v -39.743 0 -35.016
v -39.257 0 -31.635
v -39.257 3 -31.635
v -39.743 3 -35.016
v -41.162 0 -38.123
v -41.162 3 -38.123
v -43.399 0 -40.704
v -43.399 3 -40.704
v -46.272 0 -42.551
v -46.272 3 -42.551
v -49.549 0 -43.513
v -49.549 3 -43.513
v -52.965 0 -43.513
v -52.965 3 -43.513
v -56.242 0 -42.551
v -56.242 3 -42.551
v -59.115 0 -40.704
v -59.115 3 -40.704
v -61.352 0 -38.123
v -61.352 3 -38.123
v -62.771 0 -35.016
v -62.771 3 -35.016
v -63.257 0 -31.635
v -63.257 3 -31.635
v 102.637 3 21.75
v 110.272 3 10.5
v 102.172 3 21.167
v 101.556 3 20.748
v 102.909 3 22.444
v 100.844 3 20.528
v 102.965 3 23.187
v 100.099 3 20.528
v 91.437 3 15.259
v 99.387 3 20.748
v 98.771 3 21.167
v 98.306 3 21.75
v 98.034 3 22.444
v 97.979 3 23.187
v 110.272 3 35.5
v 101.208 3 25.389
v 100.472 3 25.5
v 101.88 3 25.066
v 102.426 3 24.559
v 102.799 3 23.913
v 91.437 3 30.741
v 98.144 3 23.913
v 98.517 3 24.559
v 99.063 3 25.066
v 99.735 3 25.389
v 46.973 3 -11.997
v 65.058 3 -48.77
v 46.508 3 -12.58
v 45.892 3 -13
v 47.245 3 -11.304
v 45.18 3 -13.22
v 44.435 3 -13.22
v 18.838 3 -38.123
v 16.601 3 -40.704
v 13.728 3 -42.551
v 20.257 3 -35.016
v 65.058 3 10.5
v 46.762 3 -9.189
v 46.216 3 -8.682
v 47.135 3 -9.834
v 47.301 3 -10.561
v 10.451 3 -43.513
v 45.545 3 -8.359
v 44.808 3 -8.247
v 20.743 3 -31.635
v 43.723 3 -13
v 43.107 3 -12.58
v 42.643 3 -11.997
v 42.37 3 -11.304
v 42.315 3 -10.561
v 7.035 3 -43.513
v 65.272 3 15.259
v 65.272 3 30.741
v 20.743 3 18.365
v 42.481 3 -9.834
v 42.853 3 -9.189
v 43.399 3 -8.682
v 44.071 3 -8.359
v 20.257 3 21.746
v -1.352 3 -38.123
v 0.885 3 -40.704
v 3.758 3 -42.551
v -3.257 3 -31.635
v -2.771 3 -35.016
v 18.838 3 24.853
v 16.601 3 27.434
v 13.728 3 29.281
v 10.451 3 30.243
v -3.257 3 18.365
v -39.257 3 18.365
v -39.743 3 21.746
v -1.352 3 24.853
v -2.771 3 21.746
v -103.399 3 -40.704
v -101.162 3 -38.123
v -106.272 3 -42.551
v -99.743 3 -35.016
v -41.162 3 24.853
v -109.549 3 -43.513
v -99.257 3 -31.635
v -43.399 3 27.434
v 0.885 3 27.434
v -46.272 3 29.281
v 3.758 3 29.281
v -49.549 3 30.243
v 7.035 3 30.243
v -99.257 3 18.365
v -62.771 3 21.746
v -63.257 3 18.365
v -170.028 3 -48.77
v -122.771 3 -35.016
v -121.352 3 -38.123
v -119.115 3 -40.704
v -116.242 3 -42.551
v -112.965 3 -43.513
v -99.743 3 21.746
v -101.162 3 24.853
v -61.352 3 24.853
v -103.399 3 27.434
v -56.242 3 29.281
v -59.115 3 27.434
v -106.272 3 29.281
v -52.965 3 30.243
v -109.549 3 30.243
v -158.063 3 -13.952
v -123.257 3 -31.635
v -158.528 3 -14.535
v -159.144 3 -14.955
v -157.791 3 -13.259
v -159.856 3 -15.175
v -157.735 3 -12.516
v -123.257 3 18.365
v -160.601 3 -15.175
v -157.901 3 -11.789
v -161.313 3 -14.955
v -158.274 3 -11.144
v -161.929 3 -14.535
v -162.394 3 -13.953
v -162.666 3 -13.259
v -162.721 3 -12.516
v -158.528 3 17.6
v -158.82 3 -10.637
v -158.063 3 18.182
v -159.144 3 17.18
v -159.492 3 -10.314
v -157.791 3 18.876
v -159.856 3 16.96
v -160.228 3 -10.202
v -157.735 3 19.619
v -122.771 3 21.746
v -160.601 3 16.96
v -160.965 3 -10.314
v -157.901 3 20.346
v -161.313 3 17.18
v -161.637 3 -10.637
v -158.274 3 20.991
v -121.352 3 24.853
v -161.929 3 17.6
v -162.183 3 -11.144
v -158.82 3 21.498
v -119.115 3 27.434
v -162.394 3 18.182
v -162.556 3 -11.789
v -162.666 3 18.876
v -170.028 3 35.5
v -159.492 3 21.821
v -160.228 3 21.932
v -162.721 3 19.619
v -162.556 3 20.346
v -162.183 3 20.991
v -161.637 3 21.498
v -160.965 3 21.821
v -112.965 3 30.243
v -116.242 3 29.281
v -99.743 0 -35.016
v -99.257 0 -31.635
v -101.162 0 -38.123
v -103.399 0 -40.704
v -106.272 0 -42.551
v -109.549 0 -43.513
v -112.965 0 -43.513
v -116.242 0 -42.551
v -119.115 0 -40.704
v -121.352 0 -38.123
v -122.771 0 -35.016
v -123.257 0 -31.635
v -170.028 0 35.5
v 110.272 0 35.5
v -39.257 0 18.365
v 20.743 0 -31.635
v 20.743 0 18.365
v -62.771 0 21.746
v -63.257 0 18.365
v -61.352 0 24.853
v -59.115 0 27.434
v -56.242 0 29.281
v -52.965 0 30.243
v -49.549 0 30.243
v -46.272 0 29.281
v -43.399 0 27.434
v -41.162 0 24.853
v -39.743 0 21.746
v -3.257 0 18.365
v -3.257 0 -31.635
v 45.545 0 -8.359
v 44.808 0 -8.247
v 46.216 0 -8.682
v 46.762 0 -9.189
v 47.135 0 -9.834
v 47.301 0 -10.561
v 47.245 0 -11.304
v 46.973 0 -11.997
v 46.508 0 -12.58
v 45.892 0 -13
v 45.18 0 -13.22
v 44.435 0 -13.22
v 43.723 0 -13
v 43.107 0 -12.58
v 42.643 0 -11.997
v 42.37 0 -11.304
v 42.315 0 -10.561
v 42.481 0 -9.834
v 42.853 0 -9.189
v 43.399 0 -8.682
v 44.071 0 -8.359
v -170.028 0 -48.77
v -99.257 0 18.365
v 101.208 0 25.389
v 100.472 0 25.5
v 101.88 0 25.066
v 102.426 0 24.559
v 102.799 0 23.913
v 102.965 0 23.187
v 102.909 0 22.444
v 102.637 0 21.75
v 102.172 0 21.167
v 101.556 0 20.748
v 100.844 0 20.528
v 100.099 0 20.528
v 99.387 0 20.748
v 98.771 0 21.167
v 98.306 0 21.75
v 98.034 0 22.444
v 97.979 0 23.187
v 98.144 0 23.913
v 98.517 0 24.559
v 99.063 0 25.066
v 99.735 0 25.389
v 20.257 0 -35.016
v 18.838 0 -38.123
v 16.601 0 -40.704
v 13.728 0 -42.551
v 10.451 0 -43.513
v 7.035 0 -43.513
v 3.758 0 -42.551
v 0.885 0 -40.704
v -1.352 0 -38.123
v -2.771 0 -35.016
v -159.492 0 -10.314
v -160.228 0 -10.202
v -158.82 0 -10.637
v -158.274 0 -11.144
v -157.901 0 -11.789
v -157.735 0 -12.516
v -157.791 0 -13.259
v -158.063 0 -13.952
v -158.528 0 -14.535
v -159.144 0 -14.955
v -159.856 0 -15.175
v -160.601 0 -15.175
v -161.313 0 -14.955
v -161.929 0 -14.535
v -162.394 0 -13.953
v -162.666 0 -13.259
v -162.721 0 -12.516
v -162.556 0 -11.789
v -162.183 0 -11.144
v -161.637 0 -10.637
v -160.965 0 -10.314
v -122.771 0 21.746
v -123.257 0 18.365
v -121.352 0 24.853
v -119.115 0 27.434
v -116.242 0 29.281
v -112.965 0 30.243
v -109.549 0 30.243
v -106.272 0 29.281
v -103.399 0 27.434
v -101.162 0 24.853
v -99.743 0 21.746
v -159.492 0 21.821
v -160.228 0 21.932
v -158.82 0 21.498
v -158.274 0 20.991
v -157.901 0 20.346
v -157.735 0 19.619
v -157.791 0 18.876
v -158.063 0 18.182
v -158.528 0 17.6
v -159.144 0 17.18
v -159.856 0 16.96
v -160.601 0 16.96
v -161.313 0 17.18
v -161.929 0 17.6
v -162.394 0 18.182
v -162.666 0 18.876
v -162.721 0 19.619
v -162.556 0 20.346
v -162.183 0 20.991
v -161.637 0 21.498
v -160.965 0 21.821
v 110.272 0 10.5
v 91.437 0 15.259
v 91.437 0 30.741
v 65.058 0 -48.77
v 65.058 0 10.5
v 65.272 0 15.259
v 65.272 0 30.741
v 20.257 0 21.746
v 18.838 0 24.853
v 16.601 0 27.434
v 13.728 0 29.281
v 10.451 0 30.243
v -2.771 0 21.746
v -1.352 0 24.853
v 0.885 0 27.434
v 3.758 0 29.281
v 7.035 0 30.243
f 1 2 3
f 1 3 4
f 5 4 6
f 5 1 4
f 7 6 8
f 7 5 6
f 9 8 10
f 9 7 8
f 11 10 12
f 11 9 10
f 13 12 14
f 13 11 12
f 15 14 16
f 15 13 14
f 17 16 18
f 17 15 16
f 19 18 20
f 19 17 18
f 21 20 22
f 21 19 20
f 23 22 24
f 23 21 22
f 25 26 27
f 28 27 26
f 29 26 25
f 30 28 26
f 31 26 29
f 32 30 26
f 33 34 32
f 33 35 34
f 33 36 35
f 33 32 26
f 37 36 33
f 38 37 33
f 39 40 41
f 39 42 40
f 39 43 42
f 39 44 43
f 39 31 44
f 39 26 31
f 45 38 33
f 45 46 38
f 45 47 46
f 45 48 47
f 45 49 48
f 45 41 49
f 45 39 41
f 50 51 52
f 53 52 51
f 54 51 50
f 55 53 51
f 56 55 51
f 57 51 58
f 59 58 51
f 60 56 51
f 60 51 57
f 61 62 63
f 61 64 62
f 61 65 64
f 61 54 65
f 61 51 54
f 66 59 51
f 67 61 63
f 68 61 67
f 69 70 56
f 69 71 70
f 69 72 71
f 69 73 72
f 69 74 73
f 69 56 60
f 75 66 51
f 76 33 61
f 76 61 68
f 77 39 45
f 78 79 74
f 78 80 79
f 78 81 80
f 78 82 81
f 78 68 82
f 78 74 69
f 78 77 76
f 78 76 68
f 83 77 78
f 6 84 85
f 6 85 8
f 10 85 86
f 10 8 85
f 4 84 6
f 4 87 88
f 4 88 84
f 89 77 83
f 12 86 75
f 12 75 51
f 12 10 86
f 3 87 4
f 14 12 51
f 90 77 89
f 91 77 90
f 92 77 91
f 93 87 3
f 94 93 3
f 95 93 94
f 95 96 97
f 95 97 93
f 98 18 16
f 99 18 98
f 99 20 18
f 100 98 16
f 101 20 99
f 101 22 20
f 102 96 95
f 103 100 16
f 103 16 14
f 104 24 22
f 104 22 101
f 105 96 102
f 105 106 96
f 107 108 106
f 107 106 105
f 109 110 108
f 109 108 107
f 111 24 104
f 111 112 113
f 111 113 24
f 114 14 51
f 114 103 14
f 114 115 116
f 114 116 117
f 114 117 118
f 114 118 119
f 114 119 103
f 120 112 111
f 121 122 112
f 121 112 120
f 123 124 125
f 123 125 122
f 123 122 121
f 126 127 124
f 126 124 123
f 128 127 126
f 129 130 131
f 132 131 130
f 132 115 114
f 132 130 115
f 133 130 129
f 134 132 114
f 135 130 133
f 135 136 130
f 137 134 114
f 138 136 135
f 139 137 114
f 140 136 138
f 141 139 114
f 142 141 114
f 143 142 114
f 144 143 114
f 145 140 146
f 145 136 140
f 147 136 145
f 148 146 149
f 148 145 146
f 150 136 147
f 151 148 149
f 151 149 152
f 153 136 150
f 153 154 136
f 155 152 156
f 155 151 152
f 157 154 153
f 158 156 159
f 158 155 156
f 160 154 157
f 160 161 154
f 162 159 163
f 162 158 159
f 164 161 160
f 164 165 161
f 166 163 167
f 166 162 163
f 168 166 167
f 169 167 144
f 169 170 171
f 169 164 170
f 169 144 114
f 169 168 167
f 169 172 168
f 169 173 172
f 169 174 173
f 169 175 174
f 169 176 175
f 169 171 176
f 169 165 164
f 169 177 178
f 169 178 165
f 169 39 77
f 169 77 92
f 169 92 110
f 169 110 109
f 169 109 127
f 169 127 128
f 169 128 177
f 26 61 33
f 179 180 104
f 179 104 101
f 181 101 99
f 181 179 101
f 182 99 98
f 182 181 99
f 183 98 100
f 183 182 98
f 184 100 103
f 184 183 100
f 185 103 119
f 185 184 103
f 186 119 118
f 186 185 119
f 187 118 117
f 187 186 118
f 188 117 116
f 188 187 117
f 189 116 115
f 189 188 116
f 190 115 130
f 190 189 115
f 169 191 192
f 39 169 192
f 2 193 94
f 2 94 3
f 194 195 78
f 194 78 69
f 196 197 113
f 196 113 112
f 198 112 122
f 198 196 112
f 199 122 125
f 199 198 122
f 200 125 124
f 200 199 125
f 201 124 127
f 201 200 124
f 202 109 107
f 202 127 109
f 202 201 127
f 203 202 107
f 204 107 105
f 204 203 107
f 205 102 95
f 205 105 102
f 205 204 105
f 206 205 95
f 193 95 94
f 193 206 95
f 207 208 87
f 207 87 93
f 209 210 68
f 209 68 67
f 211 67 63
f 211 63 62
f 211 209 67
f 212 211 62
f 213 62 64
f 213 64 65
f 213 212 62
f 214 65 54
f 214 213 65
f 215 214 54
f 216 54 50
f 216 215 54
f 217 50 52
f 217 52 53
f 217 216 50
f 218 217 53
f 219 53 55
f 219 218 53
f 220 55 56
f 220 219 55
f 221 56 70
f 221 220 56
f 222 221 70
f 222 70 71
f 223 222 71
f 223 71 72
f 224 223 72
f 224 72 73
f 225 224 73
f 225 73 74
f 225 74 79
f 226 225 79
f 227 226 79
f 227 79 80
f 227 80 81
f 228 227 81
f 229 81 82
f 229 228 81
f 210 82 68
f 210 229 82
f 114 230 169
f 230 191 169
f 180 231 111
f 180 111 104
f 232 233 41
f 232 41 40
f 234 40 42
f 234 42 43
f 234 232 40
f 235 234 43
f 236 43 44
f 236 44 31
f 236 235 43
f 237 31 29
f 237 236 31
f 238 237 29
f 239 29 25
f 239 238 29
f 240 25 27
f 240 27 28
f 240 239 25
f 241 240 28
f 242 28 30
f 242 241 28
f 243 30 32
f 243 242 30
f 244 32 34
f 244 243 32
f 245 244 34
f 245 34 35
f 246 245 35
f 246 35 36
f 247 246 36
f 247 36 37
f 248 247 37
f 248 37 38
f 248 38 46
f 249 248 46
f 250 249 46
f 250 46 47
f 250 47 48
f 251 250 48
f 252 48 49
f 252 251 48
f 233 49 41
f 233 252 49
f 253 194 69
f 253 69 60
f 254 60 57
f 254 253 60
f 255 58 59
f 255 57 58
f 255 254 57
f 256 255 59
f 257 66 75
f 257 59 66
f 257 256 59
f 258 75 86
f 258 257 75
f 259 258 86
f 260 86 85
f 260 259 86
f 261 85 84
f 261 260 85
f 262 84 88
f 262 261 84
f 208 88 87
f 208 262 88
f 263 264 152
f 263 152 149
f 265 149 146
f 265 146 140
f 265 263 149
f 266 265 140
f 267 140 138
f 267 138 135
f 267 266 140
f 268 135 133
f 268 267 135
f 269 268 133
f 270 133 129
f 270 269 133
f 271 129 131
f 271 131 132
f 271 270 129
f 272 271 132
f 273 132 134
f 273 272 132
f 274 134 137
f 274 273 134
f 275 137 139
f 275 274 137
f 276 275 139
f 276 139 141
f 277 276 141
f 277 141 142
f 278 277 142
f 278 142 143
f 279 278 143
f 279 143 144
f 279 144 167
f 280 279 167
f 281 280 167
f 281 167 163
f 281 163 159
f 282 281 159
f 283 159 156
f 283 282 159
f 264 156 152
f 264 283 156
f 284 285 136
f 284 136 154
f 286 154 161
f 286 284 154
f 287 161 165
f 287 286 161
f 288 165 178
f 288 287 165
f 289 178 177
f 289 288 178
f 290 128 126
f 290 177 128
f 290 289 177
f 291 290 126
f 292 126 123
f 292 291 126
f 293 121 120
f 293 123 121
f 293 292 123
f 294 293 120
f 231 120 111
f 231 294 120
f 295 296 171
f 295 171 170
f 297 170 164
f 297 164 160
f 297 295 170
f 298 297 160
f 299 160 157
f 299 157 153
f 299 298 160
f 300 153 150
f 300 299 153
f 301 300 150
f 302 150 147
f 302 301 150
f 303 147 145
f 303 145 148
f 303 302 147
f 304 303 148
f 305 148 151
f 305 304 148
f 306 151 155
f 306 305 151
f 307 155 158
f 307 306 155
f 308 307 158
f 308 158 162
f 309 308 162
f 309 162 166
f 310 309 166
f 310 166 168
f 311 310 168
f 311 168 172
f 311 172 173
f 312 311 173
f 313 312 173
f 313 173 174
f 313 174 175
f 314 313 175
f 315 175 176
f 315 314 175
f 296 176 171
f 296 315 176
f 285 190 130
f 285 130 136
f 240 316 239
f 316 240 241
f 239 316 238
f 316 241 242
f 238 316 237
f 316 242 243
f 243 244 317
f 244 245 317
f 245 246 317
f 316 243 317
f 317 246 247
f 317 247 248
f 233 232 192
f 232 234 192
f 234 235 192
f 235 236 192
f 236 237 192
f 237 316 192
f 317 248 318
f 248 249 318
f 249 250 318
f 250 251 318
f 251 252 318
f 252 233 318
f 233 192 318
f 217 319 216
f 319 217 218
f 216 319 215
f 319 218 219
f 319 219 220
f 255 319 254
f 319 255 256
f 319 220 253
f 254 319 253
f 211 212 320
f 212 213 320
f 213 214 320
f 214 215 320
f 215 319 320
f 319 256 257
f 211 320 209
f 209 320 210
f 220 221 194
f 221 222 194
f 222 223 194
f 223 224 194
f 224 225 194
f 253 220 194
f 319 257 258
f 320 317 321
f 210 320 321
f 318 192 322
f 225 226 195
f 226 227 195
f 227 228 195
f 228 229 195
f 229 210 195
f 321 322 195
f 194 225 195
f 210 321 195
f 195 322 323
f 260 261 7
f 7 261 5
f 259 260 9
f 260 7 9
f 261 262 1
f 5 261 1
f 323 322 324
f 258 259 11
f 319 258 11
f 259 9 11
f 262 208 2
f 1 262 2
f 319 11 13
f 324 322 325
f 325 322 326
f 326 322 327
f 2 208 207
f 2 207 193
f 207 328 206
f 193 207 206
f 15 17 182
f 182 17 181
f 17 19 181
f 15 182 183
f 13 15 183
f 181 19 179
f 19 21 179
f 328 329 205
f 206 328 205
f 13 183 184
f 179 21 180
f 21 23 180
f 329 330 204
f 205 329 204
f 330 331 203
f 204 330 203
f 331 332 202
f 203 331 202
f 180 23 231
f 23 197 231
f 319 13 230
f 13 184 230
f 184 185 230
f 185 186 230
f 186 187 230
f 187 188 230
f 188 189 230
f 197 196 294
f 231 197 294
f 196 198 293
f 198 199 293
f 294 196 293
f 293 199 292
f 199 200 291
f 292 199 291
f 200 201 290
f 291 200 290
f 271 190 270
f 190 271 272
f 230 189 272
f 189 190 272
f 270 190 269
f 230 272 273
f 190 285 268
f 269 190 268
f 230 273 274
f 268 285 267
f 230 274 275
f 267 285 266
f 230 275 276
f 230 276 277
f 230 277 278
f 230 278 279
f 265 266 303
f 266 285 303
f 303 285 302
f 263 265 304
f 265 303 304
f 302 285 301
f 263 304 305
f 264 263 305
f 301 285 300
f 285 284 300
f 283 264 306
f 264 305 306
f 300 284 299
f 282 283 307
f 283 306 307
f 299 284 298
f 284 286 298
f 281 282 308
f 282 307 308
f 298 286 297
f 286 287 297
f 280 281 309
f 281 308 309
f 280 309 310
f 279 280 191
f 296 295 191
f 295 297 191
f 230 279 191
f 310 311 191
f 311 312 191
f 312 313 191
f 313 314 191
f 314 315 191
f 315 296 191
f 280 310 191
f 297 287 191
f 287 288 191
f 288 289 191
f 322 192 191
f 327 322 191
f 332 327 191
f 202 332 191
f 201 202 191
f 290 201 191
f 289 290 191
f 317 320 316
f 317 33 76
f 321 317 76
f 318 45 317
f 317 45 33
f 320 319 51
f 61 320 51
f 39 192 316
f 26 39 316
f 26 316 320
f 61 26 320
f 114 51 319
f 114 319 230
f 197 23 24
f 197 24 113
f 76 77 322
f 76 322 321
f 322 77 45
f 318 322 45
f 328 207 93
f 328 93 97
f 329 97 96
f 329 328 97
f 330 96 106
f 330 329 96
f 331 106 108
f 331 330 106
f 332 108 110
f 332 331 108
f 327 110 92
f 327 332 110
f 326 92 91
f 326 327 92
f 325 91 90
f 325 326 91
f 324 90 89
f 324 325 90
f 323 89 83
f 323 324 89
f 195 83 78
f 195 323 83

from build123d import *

# Parameters (mm, degrees)
ESQUISSE1_R             = 2.5
BOSS_EXTRU_1_DEPTH      = 3
ESQUISSE2_W             = 20
ESQUISSE2_H             = 10
ENL_V_MAT_EXTRU_1_DEPTH = 174.720827721
SKETCH1_W               = 235.08624341
SKETCH1_H               = 3
BOSS_EXTRUDE1_DEPTH     = 20
CUT_EXTRUDE1_DEPTH      = 10
SKETCH3_W               = 20
SKETCH3_H               = 2.74057888
CUT_EXTRUDE2_DEPTH      = 10


with BuildPart() as part:
    # Esquisse1 → Boss.-Extru.1 (new body)
    with BuildSketch(Plane(origin=(0, 0, 0), x_dir=(1, 0, 0), z_dir=(0, 1, 0))):
        Polygon((-170.028456395, 18.77), (-170.028456395, -23), (-170.028456395, -35.5), (110.271543605, -35.5), (110.271543605, -10.5), (65.057787015, -10.5), (65.057787015, 28.77), (-170.028456395, 28.77), align=None)
        with Locations(Location((100.471543605, -23, 0), (0, 0, 270))):
            Circle(ESQUISSE1_R, mode=Mode.SUBTRACT)
        with Locations(Location((-160.228456395, -19.4325, 0), (0, 0, 270))):
            Circle(ESQUISSE1_R, mode=Mode.SUBTRACT)
        with Locations(Location((-160.228456395, 12.7025, 0), (0, 0, 270))):
            Circle(ESQUISSE1_R, mode=Mode.SUBTRACT)
        with Locations(Location((44.807787015, 10.747499922, 0), (0, 0, 270))):
            Circle(ESQUISSE1_R, mode=Mode.SUBTRACT)
    extrude(amount=BOSS_EXTRU_1_DEPTH)

    # Esquisse2 → Enlèv. mat.-Extru.1 (cut, through all)
    with BuildSketch(Plane(origin=(0, 3, 0), x_dir=(1, 0, 0), z_dir=(0, 1, 0))):
        with BuildLine():
            Line((-113.756895542, 11.635), (-113.756895542, -18.365))
            ThreePointArc((-113.756895542, -18.365), (-111.256895542, -20.865), (-108.756895542, -18.365))
            Line((-108.756895542, -18.365), (-108.756895542, 11.635))
            ThreePointArc((-108.756895542, 11.635), (-111.256895542, 14.135), (-113.756895542, 11.635))
        make_face()
        with BuildLine():
            Line((-54.98533469, 11.635), (-54.98533469, -18.365))
            ThreePointArc((-54.98533469, -18.365), (-52.48533469, -20.865), (-49.98533469, -18.365))
            Line((-49.98533469, -18.365), (-49.98533469, 11.635))
            ThreePointArc((-49.98533469, 11.635), (-52.48533469, 14.135), (-54.98533469, 11.635))
        make_face()
        with BuildLine():
            Line((3.786226163, 11.635), (3.786226163, -18.365))
            ThreePointArc((3.786226163, -18.365), (6.286226163, -20.865), (8.786226163, -18.365))
            Line((8.786226163, -18.365), (8.786226163, 11.635))
            ThreePointArc((8.786226163, 11.635), (6.286226163, 14.135), (3.786226163, 11.635))
        make_face()
        with Locations((75.271543605, -23)):
            Rectangle(ESQUISSE2_W, ESQUISSE2_H)
    extrude(amount=-ENL_V_MAT_EXTRU_1_DEPTH, mode=Mode.SUBTRACT)

    # Sketch1 → Boss-Extrude1 (add)
    with BuildSketch(Plane(origin=(0, 0, -28.77), x_dir=(-1, 0, 0), z_dir=(0, 0, -1))):
        with Locations((52.48533469, 1.5)):
            Rectangle(SKETCH1_W, SKETCH1_H)
    extrude(amount=BOSS_EXTRUDE1_DEPTH)

    # Sketch2 → Cut-Extrude1 (cut)
    with BuildSketch(Plane(origin=(0, 0, 0), x_dir=(-1, 0, 0), z_dir=(0, -1, 0))):
        with BuildLine():
            Line((99.256895542, -18.365), (99.256895542, 31.635))
            ThreePointArc((99.256895542, 31.635), (111.256895542, 43.635), (123.256895542, 31.635))
            Line((123.256895542, 31.635), (123.256895542, -18.365))
            ThreePointArc((123.256895542, -18.365), (111.256895542, -30.365), (99.256895542, -18.365))
        make_face()
        with BuildLine():
            Line((39.256895542, -18.365), (39.256895542, 31.635))
            ThreePointArc((39.256895542, 31.635), (51.256895542, 43.635), (63.256895542, 31.635))
            Line((63.256895542, 31.635), (63.256895542, -18.365))
            ThreePointArc((63.256895542, -18.365), (51.256895542, -30.365), (39.256895542, -18.365))
        make_face()
        with BuildLine():
            Line((-20.743104458, -18.365), (-20.743104458, 31.635))
            ThreePointArc((-20.743104458, 31.635), (-8.743104458, 43.635), (3.256895542, 31.635))
            Line((3.256895542, 31.635), (3.256895542, -18.365))
            ThreePointArc((3.256895542, -18.365), (-8.743104458, -30.365), (-20.743104458, -18.365))
        make_face()
    extrude(amount=-CUT_EXTRUDE1_DEPTH, mode=Mode.SUBTRACT)

    # Sketch3 → Cut-Extrude2 (cut)
    with BuildSketch(Plane(origin=(0, 3, 0), x_dir=(1, 0, 0), z_dir=(0, 1, 0))):
        Polygon((85.271543605, -28), (85.271543605, -30.74057888), (91.436540381, -30.74057888), (91.436540381, -15.25942112), (85.271543605, -15.25942112), (85.271543605, -18), align=None)
        with Locations((75.271543605, -16.62971056)):
            Rectangle(SKETCH3_W, SKETCH3_H)
        with Locations((75.271543605, -29.37028944)):
            Rectangle(SKETCH3_W, SKETCH3_H)
    extrude(amount=-CUT_EXTRUDE2_DEPTH, mode=Mode.SUBTRACT)


solid = part.part
